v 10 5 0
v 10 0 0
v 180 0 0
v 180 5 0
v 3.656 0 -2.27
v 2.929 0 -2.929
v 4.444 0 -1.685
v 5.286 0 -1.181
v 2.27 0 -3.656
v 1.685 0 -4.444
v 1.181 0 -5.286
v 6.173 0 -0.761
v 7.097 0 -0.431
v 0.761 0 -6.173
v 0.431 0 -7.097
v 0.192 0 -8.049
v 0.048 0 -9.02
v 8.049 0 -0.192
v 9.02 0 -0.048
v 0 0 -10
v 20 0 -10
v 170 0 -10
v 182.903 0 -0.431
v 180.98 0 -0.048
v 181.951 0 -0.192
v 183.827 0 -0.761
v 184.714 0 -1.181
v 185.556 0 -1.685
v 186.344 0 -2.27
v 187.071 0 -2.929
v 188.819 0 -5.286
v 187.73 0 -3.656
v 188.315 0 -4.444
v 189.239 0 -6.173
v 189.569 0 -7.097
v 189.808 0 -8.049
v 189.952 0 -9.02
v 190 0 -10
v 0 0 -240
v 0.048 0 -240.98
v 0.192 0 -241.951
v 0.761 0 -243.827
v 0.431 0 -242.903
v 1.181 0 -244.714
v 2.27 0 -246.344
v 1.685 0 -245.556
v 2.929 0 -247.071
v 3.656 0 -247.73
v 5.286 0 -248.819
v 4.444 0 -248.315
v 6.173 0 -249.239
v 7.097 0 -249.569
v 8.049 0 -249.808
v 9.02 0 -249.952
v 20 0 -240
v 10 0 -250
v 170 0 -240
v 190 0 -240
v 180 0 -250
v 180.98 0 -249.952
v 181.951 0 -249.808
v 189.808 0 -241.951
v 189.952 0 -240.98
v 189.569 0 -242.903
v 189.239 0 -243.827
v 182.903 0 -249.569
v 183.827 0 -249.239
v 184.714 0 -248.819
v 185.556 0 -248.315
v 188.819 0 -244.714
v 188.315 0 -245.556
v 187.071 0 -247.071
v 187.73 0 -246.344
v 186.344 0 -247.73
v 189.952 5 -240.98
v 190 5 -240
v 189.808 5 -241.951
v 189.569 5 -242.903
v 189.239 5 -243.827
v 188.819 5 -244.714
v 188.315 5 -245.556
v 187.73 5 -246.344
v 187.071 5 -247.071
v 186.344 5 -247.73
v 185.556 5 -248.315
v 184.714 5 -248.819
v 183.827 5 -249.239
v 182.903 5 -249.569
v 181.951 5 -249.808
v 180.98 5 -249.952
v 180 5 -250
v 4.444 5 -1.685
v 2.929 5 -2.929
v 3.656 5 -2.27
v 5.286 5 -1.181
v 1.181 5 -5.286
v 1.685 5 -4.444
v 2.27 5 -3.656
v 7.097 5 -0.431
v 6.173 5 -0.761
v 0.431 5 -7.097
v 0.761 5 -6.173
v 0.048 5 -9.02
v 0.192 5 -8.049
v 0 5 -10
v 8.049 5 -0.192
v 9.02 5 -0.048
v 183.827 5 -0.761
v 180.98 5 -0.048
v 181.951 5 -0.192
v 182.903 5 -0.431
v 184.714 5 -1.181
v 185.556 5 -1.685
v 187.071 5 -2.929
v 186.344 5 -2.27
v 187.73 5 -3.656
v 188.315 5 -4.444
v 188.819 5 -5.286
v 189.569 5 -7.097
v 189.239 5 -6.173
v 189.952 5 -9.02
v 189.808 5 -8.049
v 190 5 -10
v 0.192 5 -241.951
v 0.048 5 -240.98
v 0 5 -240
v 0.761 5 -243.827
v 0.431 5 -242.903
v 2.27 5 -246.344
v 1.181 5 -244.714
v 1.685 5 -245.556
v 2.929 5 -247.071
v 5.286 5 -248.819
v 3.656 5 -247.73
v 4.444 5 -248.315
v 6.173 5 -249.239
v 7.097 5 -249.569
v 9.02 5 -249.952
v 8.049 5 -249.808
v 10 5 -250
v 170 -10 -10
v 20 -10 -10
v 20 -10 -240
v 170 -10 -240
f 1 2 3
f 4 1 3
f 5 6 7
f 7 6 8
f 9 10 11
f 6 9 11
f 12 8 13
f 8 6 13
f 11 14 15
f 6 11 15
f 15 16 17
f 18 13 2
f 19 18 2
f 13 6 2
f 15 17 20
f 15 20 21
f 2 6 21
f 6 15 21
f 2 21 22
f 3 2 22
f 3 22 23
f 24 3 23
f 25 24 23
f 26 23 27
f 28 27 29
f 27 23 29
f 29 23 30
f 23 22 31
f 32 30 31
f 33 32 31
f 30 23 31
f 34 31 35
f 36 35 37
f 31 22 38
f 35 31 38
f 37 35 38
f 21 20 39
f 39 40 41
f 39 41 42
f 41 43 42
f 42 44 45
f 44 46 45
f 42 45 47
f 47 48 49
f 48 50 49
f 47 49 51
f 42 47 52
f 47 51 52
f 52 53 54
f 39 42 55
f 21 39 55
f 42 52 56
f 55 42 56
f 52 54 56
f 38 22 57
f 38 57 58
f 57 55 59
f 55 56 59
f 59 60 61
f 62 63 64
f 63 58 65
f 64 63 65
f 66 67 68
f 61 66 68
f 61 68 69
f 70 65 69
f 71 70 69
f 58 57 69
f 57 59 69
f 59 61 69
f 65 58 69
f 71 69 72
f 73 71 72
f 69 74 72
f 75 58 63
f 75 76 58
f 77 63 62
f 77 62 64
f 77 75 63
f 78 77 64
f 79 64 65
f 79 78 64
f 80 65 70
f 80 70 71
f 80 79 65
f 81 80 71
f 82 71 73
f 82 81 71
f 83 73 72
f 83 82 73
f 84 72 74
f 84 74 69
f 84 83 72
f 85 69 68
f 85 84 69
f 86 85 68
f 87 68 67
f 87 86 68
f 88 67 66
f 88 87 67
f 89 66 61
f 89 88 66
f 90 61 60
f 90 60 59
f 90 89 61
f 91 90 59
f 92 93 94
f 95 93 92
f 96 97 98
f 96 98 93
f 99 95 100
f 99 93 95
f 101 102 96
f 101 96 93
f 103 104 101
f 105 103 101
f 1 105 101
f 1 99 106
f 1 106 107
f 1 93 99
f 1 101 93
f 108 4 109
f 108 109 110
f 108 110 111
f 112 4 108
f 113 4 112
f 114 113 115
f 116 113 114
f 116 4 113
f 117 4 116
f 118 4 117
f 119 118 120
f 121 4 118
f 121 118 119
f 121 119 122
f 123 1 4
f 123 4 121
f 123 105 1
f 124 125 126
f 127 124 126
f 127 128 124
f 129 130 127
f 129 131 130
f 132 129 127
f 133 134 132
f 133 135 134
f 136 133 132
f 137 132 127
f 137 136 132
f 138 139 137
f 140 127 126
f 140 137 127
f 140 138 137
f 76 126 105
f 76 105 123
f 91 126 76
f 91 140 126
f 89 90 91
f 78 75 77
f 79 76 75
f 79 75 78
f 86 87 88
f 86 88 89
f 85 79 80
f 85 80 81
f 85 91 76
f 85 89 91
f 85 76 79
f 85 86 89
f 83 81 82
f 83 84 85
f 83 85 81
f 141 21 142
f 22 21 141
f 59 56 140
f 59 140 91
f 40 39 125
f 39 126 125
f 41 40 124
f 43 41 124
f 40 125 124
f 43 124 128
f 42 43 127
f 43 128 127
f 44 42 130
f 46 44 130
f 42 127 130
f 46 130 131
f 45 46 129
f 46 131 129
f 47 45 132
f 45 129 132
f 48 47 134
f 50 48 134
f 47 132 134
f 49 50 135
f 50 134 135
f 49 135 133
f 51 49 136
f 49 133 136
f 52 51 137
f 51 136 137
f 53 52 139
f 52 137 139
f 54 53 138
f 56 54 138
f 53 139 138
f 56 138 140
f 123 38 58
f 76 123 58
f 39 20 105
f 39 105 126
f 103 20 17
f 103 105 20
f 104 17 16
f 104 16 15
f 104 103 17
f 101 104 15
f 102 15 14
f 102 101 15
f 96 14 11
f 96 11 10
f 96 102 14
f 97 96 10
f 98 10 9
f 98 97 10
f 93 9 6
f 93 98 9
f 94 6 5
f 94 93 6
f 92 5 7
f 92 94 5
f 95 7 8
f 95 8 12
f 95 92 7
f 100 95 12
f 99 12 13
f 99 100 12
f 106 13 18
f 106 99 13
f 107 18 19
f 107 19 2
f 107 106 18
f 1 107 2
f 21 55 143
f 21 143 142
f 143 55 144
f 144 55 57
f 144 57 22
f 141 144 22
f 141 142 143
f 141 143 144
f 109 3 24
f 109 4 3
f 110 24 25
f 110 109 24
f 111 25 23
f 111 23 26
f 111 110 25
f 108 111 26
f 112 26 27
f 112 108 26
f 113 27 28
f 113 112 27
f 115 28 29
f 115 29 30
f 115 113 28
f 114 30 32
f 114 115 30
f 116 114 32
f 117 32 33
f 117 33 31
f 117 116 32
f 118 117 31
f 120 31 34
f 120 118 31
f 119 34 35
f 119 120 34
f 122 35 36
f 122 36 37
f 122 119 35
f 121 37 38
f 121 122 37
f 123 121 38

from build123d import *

# Parameters (mm, degrees)
CROQUIS1_W              = 190
CROQUIS1_H              = 250
SALIENTE_EXTRUIR1_DEPTH = 5
REDONDEO1_R             = 10
CROQUIS2_W              = 150
CROQUIS2_H              = 230
SALIENTE_EXTRUIR2_DEPTH = 10


with BuildPart() as part:
    # Croquis1 → Saliente-Extruir1 (new body)
    with BuildSketch(Plane(origin=(0, 0, 0), x_dir=(1, 0, 0), z_dir=(0, 1, 0))):
        with Locations((95, 125)):
            Rectangle(CROQUIS1_W, CROQUIS1_H)
    extrude(amount=SALIENTE_EXTRUIR1_DEPTH)

    # Redondeo1
    redondeo1_edges = [part.edges().sort_by_distance(p)[0] for p in [
        (0, 2.5, -250),
        (190, 2.5, -250),
        (190, 2.5, 0),
        (0, 2.5, 0),
    ]]
    fillet(redondeo1_edges, radius=REDONDEO1_R)

    # Croquis2 → Saliente-Extruir2 (add)
    with BuildSketch(Plane.XZ):
        with Locations((95, -125)):
            Rectangle(CROQUIS2_W, CROQUIS2_H)
    extrude(amount=SALIENTE_EXTRUIR2_DEPTH)


solid = part.part
